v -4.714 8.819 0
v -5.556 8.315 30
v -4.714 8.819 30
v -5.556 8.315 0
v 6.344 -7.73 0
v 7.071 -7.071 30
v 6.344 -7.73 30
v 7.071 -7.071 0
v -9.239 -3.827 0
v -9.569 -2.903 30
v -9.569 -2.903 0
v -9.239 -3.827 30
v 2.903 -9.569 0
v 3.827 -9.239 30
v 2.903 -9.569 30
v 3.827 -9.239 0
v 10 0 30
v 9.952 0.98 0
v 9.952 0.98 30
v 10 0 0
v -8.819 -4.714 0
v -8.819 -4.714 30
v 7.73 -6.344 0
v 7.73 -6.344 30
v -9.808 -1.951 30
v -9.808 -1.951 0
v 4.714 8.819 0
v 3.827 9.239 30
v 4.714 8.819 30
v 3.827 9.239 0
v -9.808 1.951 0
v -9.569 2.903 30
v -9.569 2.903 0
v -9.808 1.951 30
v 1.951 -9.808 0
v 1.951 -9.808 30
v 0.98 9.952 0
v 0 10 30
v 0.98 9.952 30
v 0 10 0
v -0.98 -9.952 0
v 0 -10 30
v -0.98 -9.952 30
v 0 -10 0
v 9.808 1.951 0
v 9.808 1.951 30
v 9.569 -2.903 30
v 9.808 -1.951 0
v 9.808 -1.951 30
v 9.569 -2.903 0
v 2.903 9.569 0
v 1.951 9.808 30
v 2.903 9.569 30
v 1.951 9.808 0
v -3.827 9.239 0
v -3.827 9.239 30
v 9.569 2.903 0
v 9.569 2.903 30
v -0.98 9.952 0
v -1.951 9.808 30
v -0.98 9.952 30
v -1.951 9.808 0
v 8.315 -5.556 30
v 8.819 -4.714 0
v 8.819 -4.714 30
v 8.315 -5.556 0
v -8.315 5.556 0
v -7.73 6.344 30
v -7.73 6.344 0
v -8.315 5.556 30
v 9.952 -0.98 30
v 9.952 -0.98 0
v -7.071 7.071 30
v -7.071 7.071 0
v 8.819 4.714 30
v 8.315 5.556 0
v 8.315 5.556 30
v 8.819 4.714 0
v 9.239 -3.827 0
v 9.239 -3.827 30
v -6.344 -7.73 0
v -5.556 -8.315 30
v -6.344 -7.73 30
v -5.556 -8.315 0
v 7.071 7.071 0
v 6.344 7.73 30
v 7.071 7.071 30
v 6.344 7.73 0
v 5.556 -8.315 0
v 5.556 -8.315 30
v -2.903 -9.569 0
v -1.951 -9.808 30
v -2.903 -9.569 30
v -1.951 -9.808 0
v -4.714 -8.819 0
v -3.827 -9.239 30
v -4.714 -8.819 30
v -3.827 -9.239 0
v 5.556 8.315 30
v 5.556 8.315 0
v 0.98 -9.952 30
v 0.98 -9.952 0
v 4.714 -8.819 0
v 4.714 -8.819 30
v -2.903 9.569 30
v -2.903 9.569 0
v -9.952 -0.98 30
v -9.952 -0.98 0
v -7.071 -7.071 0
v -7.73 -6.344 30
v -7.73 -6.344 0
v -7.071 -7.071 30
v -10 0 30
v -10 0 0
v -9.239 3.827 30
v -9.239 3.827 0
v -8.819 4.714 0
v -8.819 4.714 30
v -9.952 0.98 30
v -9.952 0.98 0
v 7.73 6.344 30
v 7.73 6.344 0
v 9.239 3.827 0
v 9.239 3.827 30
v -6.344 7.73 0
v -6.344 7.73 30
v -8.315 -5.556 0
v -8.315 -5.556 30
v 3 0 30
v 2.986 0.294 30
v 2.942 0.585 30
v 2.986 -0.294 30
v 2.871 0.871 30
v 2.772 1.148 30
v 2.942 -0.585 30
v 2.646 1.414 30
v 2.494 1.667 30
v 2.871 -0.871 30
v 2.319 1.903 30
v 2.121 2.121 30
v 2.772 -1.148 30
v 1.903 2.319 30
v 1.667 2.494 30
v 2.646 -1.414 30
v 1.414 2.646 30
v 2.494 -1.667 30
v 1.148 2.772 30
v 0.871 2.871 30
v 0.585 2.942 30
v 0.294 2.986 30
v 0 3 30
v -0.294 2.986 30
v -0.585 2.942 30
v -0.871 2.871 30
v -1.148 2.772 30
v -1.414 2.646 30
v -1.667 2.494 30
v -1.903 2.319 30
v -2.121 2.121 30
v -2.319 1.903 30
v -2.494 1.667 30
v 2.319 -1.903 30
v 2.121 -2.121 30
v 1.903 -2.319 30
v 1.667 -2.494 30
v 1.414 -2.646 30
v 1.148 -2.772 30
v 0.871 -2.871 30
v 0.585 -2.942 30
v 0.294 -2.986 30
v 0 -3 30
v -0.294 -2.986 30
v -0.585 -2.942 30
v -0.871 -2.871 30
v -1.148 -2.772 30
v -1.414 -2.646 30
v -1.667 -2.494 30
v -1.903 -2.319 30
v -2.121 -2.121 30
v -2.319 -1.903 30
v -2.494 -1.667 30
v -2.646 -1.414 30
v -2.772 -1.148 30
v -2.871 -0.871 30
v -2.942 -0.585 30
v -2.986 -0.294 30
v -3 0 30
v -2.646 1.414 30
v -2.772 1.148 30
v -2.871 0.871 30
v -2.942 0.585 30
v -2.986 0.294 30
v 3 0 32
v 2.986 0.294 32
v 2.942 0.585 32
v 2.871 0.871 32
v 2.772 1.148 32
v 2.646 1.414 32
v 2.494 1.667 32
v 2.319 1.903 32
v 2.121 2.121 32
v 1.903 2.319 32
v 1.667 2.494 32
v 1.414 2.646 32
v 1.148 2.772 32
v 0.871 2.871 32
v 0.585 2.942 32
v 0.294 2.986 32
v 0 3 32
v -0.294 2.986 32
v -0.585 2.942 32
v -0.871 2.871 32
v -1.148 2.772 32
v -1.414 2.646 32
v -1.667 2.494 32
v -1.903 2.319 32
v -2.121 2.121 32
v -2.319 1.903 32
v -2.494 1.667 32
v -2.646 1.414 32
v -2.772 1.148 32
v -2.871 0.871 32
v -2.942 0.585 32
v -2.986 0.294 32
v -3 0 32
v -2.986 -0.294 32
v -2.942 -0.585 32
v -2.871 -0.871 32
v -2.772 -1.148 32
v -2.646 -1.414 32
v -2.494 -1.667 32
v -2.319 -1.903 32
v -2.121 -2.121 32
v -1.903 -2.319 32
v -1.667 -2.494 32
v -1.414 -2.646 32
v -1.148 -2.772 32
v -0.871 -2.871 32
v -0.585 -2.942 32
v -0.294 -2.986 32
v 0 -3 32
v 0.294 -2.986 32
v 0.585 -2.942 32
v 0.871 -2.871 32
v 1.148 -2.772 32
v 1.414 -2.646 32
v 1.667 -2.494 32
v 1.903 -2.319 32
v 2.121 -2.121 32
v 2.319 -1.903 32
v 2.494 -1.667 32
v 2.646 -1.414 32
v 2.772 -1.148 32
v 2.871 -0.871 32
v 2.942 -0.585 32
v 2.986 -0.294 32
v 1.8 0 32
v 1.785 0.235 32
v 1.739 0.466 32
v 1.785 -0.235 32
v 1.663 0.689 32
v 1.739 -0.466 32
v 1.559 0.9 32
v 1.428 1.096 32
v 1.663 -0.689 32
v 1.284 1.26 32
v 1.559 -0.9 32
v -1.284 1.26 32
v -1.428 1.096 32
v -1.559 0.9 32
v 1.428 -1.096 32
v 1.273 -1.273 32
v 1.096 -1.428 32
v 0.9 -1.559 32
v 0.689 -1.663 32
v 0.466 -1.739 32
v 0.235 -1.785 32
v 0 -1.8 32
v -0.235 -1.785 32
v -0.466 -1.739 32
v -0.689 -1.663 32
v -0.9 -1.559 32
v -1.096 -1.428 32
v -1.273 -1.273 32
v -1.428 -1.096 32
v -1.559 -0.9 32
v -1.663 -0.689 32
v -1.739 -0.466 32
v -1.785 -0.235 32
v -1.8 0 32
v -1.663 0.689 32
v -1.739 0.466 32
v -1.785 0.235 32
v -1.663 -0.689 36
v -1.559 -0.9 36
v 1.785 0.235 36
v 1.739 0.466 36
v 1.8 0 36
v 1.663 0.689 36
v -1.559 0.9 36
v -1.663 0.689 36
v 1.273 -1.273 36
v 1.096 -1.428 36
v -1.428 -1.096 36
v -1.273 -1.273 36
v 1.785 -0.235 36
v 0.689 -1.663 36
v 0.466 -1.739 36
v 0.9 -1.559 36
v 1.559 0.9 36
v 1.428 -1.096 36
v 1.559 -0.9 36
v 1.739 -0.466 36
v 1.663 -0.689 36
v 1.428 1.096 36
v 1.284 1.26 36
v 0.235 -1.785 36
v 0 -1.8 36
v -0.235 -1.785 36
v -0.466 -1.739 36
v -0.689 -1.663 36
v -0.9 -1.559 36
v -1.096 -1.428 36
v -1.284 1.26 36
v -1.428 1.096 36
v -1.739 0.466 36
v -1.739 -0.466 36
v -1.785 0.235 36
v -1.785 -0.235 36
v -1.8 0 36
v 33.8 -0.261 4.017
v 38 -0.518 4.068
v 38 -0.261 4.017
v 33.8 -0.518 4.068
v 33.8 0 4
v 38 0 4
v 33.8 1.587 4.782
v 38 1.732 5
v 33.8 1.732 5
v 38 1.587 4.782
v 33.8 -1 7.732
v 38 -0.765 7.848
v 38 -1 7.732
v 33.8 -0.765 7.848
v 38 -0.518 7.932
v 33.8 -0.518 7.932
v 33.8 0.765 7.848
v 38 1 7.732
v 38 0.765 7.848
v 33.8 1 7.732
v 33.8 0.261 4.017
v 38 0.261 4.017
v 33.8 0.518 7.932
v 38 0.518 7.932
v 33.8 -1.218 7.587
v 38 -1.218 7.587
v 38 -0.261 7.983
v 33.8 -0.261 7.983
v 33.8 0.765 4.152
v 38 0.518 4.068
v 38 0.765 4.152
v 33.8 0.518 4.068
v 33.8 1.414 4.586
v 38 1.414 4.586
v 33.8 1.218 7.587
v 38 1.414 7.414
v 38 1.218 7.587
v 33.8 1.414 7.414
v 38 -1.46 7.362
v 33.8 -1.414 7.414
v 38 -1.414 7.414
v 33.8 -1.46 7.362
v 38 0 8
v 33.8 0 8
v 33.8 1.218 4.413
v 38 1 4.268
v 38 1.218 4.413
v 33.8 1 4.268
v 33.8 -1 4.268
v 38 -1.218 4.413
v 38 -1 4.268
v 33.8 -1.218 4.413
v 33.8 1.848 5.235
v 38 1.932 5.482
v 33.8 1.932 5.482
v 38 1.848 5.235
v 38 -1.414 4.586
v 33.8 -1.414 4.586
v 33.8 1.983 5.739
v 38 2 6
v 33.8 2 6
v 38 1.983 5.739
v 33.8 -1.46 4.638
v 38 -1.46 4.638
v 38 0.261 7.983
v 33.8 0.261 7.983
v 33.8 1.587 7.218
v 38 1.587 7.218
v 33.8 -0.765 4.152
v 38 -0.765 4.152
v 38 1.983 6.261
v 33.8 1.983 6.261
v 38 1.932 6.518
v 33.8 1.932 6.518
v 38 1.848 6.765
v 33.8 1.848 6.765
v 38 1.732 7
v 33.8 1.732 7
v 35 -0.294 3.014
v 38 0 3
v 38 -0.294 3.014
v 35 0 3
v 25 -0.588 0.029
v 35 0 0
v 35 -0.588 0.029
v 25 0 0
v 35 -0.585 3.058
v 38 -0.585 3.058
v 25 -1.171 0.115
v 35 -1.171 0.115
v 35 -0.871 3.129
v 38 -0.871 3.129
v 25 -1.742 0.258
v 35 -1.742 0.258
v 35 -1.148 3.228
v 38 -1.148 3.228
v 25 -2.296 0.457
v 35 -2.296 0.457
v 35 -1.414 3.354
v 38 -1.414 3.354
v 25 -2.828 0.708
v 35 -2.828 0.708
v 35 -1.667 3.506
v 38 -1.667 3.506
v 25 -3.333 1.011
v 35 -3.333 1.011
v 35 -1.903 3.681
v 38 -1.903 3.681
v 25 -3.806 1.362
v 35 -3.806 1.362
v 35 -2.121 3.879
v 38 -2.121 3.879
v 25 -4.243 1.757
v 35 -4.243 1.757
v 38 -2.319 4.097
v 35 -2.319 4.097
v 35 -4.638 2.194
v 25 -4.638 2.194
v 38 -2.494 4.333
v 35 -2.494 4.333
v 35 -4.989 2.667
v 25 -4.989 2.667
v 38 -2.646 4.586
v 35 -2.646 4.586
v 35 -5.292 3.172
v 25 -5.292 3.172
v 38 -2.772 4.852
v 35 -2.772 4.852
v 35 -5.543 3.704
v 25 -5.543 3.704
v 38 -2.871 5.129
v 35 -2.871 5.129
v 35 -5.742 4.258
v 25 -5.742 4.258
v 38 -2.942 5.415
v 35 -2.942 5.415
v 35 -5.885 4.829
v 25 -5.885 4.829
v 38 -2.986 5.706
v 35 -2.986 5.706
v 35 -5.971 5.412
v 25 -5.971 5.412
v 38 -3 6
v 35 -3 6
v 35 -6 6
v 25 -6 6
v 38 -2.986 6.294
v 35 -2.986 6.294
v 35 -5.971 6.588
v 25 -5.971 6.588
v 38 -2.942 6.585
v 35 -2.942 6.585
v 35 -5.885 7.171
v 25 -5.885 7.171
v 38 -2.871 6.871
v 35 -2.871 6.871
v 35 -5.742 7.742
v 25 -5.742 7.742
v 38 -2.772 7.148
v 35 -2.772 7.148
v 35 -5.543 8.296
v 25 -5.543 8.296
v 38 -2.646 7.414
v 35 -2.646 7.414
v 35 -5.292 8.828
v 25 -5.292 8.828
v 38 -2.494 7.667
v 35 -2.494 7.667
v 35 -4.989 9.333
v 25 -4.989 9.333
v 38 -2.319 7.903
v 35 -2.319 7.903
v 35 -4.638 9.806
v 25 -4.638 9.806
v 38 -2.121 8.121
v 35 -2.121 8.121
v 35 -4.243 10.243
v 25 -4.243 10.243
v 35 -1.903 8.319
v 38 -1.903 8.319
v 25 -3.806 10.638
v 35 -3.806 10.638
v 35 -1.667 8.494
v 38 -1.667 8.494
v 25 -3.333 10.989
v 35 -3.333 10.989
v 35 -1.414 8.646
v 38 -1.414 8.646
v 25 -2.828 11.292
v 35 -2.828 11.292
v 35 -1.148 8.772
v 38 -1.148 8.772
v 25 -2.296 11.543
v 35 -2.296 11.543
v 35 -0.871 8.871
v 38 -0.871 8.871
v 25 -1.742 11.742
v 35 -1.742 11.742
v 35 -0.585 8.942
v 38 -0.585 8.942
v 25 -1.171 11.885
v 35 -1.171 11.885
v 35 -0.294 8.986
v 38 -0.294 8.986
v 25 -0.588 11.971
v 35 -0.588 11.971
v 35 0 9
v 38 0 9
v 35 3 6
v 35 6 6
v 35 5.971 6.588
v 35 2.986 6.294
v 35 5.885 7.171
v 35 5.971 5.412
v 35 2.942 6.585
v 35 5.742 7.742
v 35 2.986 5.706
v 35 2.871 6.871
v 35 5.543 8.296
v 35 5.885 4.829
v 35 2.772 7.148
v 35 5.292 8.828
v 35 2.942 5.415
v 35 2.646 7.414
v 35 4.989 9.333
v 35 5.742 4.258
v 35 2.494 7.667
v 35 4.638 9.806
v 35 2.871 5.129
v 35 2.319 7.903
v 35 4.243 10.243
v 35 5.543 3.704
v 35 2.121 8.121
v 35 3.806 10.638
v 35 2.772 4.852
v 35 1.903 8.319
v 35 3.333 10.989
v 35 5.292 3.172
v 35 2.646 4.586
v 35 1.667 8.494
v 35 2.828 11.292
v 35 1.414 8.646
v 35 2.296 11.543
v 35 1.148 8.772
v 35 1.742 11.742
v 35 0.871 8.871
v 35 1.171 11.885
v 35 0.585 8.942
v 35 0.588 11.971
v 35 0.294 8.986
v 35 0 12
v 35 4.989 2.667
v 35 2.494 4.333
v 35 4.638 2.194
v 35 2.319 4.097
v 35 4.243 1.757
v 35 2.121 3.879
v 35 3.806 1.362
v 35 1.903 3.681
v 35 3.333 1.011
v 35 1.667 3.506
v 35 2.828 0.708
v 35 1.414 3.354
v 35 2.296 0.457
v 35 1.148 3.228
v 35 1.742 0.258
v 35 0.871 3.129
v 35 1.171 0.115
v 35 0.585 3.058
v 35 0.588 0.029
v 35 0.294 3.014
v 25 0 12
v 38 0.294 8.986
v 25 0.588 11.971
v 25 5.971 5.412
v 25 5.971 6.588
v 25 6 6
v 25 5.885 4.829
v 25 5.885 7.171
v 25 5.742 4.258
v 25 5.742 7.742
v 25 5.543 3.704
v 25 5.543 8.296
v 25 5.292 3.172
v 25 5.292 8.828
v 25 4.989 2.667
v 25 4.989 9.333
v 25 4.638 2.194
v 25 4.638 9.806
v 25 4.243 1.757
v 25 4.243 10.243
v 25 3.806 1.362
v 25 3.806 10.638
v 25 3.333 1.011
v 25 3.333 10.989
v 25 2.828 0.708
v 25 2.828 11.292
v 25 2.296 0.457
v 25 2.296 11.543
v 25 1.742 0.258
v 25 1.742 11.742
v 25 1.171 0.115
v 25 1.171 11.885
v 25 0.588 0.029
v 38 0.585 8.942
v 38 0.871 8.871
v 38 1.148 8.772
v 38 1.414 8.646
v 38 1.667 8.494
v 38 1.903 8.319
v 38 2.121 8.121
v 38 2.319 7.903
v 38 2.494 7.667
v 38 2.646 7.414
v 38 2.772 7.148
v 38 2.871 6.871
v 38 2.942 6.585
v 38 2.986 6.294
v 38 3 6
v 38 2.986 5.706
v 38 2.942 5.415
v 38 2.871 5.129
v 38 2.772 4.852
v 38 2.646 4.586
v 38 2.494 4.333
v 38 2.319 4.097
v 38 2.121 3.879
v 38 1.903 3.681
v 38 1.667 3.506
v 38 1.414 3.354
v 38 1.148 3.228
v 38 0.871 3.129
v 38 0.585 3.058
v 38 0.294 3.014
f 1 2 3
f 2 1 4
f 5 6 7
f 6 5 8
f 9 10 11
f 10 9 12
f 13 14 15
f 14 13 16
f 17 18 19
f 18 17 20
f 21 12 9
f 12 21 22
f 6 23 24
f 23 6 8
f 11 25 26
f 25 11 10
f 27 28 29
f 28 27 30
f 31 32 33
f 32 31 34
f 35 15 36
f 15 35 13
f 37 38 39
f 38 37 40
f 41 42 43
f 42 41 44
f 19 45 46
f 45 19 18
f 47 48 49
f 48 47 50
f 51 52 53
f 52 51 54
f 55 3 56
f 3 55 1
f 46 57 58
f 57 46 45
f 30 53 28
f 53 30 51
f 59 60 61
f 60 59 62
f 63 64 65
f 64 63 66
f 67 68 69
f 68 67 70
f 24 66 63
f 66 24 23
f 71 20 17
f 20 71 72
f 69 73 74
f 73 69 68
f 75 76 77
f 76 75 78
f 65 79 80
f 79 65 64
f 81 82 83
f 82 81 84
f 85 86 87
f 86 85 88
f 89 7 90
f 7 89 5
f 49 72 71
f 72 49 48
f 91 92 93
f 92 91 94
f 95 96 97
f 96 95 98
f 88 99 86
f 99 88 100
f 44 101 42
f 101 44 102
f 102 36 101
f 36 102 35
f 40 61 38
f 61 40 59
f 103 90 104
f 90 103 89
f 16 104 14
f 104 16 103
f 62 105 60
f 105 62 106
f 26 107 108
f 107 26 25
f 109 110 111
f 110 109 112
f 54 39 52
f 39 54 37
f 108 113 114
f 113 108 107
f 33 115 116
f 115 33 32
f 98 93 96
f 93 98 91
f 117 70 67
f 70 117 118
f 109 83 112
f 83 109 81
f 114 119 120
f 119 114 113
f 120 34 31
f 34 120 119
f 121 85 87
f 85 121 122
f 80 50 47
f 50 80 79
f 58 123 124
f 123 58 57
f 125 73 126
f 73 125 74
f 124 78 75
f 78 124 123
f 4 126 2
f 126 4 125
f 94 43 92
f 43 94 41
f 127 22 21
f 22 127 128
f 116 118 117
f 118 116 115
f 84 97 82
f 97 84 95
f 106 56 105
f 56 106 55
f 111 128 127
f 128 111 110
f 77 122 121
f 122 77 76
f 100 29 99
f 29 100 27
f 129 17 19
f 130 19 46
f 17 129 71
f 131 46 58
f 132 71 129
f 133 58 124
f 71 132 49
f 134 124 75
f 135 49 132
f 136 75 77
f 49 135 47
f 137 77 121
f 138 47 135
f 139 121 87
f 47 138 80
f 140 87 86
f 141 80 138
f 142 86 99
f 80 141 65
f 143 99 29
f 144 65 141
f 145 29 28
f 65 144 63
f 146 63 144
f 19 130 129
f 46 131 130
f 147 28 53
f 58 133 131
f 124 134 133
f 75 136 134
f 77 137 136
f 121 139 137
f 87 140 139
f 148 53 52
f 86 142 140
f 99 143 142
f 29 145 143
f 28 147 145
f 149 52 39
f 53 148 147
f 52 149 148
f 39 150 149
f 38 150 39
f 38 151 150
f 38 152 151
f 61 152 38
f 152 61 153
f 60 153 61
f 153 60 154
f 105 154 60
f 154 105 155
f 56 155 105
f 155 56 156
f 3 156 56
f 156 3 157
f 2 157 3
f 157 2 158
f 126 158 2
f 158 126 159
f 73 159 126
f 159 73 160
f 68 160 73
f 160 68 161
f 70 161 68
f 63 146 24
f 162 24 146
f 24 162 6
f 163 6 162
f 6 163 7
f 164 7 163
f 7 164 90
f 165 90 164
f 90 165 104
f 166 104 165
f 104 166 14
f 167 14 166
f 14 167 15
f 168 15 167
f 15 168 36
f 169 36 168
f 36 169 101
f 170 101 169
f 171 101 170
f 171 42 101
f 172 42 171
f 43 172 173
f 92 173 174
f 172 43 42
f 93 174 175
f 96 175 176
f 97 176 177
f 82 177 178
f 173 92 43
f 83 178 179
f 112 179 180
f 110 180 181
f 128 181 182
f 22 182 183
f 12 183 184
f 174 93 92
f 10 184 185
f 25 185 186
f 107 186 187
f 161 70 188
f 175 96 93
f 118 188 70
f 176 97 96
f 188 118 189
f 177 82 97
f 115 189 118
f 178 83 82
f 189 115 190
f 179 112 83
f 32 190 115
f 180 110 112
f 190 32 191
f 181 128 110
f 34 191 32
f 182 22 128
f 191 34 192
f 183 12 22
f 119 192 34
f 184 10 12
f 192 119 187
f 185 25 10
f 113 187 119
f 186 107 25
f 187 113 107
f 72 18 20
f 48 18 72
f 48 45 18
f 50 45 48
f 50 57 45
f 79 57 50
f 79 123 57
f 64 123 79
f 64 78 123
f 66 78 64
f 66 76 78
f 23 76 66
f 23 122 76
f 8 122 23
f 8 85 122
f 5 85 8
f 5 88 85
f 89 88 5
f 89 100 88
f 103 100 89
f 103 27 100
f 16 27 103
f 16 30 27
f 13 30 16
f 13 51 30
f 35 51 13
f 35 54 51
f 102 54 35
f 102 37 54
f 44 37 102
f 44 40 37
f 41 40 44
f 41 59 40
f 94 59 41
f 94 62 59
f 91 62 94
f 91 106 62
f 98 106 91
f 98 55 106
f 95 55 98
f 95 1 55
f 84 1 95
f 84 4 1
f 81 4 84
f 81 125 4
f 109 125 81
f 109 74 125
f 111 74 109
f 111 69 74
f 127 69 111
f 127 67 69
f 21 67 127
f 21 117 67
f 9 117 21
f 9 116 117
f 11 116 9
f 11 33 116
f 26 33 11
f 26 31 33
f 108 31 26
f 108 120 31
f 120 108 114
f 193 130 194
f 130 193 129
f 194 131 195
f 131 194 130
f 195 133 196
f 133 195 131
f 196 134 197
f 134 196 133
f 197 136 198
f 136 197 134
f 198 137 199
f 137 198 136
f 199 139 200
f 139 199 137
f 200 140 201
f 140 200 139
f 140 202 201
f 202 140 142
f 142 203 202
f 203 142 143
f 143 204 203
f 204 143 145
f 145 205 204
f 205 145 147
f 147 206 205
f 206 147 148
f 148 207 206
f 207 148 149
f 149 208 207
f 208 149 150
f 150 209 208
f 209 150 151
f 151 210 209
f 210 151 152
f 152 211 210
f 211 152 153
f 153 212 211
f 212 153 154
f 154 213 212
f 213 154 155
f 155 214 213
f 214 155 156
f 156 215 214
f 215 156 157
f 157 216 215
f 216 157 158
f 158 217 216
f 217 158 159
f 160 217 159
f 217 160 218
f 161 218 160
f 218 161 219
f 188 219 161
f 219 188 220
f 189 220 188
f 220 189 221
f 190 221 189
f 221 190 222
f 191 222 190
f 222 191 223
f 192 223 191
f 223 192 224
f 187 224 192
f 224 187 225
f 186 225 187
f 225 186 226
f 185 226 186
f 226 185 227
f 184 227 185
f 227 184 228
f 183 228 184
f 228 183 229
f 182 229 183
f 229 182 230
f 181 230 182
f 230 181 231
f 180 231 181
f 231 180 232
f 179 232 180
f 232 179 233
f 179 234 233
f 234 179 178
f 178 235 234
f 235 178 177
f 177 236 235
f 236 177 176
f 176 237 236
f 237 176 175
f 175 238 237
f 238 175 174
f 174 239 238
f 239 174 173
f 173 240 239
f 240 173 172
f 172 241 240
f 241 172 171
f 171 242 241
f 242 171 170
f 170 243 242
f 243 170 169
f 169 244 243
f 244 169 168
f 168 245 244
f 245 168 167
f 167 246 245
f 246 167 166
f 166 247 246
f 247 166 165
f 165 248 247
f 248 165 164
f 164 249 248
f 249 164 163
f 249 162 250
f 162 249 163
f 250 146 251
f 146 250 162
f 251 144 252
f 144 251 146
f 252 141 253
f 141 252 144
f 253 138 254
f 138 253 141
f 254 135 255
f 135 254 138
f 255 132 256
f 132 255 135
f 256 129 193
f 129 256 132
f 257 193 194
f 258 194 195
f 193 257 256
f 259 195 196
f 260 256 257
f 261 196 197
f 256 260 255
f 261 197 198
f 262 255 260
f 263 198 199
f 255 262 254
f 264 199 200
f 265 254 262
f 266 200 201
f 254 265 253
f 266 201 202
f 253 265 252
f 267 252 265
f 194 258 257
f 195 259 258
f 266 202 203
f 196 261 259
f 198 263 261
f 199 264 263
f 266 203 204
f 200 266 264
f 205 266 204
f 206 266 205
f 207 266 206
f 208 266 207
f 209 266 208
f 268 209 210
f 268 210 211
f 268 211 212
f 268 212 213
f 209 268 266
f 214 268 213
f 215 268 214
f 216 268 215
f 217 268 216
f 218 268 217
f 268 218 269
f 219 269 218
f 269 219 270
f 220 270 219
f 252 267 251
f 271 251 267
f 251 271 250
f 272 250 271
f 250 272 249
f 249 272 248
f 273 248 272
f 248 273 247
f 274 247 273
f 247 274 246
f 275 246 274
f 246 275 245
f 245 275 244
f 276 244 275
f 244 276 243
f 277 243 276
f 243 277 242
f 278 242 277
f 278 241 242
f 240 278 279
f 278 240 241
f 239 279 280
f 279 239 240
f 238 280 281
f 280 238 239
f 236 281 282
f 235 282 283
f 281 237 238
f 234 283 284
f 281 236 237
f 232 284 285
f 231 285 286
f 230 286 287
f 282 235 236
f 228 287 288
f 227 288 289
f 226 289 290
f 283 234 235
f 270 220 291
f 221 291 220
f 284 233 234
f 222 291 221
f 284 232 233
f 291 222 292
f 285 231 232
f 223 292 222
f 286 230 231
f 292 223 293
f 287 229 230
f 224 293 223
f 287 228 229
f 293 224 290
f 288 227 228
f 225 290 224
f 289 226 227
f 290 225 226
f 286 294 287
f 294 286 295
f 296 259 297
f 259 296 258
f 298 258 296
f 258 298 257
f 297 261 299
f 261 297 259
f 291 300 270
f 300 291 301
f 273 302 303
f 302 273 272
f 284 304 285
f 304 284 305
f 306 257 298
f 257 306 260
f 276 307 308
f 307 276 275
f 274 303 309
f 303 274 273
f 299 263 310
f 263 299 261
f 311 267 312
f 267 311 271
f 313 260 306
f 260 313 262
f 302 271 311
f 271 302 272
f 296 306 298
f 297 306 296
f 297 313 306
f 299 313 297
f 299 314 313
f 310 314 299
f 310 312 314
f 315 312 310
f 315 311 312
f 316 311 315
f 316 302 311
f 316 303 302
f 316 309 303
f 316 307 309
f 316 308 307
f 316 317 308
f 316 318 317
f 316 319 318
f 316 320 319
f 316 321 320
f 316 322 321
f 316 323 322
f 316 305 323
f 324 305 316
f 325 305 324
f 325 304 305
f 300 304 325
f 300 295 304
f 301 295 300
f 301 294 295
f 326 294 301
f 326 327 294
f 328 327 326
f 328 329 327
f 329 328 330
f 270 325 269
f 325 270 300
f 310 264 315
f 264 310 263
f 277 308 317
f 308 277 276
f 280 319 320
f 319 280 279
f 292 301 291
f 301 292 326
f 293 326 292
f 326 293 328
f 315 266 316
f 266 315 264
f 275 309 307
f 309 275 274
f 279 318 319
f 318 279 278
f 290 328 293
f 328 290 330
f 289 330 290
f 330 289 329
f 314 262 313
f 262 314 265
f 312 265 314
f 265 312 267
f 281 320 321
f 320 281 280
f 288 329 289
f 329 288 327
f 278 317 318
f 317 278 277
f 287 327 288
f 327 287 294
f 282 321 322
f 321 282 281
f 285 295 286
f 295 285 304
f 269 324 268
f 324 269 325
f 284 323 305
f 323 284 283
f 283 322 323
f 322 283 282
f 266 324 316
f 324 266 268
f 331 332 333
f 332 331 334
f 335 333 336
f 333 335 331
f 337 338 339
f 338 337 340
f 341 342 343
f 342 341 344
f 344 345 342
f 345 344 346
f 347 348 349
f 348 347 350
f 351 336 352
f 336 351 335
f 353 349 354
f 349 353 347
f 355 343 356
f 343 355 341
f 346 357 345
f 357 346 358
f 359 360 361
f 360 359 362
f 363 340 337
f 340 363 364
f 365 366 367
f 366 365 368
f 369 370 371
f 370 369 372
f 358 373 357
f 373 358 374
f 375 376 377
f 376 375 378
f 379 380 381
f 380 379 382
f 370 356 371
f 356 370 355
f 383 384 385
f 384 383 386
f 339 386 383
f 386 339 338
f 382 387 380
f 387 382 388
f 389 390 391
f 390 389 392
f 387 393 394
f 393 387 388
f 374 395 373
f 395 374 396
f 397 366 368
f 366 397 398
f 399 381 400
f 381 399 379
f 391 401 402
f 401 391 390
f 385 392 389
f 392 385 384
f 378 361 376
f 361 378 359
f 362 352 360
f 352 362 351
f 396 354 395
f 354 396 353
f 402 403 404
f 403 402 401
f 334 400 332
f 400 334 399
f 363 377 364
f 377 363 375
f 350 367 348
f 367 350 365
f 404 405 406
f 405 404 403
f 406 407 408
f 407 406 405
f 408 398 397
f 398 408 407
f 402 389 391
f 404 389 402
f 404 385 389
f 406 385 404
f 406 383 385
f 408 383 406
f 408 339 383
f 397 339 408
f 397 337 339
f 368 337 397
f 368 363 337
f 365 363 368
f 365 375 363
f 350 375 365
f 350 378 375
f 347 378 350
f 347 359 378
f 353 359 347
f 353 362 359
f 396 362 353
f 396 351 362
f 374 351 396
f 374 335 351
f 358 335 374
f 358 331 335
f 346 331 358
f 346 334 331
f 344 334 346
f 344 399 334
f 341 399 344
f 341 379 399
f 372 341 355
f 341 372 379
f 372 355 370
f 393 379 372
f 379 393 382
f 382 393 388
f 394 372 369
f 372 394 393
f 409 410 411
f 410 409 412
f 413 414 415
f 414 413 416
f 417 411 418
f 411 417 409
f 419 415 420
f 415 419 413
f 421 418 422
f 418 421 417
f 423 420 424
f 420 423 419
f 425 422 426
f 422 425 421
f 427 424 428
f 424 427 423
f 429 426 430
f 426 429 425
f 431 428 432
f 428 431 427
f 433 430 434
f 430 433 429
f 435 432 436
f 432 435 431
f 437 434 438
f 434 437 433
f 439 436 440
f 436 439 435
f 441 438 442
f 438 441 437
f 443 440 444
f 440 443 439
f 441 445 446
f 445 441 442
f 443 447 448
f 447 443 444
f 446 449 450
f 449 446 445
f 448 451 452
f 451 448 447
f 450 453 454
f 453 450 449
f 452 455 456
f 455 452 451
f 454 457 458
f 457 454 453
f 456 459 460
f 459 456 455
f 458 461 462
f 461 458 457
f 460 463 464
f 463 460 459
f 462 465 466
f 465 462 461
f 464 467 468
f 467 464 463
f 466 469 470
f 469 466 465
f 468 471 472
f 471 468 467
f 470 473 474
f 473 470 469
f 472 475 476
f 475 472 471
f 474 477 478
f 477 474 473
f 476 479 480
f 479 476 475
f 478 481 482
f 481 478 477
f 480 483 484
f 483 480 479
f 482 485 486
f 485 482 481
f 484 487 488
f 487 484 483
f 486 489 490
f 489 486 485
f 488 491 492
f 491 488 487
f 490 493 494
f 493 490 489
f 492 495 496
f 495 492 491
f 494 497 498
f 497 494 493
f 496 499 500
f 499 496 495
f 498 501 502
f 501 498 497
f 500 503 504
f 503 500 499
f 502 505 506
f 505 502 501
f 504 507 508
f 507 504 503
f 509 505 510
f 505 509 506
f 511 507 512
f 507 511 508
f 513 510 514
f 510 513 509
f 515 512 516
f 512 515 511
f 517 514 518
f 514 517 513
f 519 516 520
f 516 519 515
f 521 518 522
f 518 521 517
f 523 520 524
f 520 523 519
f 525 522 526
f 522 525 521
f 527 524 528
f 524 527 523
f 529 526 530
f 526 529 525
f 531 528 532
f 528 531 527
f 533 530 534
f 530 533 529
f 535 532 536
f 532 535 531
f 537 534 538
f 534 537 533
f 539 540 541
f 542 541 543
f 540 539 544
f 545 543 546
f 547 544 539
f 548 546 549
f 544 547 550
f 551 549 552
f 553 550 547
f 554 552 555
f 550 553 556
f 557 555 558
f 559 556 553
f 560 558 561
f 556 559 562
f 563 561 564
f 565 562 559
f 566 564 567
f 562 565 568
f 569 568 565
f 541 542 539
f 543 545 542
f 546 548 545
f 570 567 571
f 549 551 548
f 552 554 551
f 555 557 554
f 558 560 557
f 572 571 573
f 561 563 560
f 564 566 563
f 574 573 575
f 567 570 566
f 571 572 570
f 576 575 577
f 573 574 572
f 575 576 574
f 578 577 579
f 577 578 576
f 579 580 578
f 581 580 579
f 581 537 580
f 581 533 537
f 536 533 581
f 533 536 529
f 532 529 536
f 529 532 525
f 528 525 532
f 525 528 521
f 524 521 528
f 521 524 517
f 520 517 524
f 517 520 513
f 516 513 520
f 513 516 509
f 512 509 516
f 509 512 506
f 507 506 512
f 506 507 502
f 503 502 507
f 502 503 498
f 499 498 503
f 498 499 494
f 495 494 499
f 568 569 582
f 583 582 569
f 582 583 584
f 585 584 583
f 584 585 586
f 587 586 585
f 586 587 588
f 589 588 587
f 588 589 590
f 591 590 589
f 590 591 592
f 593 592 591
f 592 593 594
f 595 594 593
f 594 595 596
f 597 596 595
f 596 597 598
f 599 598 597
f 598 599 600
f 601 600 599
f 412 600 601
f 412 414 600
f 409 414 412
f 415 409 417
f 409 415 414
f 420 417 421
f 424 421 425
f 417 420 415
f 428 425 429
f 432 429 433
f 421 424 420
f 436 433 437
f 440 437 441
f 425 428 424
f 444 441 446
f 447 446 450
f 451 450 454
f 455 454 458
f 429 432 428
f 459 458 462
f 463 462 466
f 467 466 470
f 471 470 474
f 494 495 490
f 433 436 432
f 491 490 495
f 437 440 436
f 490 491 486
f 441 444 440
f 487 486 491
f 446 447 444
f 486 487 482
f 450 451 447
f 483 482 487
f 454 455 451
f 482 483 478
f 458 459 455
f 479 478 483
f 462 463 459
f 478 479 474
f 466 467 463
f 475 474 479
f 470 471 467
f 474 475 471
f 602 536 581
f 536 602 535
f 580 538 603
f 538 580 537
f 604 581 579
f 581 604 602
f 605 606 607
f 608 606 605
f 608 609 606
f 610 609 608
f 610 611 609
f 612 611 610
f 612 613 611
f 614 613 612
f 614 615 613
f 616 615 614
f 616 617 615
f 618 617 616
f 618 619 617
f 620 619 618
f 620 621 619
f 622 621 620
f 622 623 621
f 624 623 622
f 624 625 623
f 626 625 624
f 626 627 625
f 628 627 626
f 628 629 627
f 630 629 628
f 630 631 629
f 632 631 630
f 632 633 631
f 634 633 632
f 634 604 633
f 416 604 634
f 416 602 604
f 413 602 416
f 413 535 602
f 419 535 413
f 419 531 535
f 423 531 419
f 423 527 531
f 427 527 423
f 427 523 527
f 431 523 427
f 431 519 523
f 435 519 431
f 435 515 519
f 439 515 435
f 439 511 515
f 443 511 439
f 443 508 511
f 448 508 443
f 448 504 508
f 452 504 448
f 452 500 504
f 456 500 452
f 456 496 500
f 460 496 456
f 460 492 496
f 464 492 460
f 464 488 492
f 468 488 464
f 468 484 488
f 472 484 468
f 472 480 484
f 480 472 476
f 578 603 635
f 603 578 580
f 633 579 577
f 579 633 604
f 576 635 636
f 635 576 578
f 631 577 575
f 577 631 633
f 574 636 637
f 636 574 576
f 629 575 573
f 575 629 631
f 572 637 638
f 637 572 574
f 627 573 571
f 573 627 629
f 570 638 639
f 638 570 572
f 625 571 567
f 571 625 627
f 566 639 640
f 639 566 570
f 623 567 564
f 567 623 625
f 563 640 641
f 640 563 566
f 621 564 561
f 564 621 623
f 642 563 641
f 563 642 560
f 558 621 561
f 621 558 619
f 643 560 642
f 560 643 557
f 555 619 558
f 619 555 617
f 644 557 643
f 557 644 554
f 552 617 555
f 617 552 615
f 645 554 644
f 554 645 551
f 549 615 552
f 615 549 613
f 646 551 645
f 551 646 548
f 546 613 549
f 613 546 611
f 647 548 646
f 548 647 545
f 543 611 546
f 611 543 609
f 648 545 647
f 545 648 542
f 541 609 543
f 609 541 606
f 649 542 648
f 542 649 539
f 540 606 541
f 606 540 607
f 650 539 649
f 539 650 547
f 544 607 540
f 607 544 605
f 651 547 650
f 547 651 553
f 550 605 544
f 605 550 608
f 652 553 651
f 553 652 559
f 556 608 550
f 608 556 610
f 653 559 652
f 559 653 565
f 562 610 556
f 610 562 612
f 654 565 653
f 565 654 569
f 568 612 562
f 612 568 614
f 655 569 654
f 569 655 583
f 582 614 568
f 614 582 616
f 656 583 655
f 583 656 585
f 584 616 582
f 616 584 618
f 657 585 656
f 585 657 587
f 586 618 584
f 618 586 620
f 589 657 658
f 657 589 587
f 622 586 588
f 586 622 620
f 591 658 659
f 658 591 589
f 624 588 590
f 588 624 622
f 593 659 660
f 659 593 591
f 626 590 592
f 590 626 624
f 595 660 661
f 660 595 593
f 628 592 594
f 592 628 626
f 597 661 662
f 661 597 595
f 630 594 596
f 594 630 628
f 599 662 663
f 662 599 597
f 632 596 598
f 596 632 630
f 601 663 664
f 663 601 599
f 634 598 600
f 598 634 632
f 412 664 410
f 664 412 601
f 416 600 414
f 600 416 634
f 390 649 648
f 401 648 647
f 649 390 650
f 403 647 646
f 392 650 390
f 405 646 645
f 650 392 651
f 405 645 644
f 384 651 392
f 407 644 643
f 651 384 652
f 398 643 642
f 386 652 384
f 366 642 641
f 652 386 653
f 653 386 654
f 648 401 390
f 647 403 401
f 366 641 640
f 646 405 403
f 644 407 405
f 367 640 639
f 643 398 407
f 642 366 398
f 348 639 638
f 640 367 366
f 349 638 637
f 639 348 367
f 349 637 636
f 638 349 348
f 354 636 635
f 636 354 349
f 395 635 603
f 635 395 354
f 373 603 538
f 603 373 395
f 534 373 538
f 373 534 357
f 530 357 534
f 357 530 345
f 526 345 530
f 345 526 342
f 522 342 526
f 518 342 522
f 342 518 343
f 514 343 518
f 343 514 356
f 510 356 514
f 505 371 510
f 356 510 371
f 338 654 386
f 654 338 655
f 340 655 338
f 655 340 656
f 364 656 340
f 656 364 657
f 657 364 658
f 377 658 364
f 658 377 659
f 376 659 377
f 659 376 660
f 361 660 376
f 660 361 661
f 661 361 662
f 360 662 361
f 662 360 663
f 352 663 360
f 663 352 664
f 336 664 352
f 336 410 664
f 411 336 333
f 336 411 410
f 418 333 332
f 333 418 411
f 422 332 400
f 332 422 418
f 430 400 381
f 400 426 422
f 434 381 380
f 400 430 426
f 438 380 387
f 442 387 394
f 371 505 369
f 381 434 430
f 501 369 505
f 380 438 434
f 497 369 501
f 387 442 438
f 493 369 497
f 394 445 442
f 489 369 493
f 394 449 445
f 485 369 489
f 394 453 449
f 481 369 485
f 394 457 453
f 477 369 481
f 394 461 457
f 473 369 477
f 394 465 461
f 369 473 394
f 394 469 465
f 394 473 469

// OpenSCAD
// Generated from scene.json by ScadBuddy; edit the scene, or eject (scene_eject) to edit this file
leaves_x = 70;

module sb_key(d, h, key, grow = 0) {
  r = d / 2 + grow;
  if (key == "hex") cylinder(h = h, r = r / cos(30), $fn = 6);
  else if (key == "flat") intersection() {
    cylinder(h = h, r = r, $fn = 48);
    translate([-r, -r, 0]) cube([2 * r, r + 0.35 * d + grow, h]);
  }
  else cylinder(h = h, r = r, $fn = 48);
}

module o1() {
  color("#F08A24") intersection() {
    import("meshes/o1-p1.3mf");
    translate([0, 0, 32]) multmatrix([[1, 0, 0, 0], [0, 1, 0, 0], [0, 0, 1, 0], [0, 0, 0, 1]]) translate([-2000, -2000, -4000]) cube(4000);
  }
  color("#3A7D2C") intersection() {
    import("meshes/o1-p2.3mf");
    translate([0, 0, 32]) multmatrix([[1, 0, 0, 0], [0, 1, 0, 0], [0, 0, 1, 0], [0, 0, 0, 1]]) translate([-2000, -2000, -4000]) cube(4000);
  }
  color("#3A7D2C") translate([0, 0, 32]) multmatrix([[1, 0, 0, 0], [0, 1, 0, 0], [0, 0, 1, 0], [0, 0, 0, 1]]) sb_key(3.6, 4, "flat");
}

module o2() {
  color("#F08A24") difference() {
    intersection() {
      import("meshes/o1-p1.3mf");
      translate([0, 0, 32]) multmatrix([[1, 0, 0, 0], [0, 1, 0, 0], [0, 0, 1, 0], [0, 0, 0, 1]]) translate([-2000, -2000, 0]) cube(4000);
    }
    translate([0, 0, 32]) multmatrix([[1, 0, 0, 0], [0, 1, 0, 0], [0, 0, 1, 0], [0, 0, 0, 1]]) translate([0, 0, -0.01]) sb_key(3.6, 4 + 0.2 + 0.01, "flat", 0.2);
  }
  color("#3A7D2C") difference() {
    intersection() {
      import("meshes/o1-p2.3mf");
      translate([0, 0, 32]) multmatrix([[1, 0, 0, 0], [0, 1, 0, 0], [0, 0, 1, 0], [0, 0, 0, 1]]) translate([-2000, -2000, 0]) cube(4000);
    }
    translate([0, 0, 32]) multmatrix([[1, 0, 0, 0], [0, 1, 0, 0], [0, 0, 1, 0], [0, 0, 0, 1]]) translate([0, 0, -0.01]) sb_key(3.6, 4 + 0.2 + 0.01, "flat", 0.2);
  }
}

translate([0, 0, 0]) rotate([0, 0, 0]) scale([1, 1, 1]) o1();
translate([leaves_x, 0, 6]) rotate([0, 90, -180]) scale([1, 1, 1]) o2();
